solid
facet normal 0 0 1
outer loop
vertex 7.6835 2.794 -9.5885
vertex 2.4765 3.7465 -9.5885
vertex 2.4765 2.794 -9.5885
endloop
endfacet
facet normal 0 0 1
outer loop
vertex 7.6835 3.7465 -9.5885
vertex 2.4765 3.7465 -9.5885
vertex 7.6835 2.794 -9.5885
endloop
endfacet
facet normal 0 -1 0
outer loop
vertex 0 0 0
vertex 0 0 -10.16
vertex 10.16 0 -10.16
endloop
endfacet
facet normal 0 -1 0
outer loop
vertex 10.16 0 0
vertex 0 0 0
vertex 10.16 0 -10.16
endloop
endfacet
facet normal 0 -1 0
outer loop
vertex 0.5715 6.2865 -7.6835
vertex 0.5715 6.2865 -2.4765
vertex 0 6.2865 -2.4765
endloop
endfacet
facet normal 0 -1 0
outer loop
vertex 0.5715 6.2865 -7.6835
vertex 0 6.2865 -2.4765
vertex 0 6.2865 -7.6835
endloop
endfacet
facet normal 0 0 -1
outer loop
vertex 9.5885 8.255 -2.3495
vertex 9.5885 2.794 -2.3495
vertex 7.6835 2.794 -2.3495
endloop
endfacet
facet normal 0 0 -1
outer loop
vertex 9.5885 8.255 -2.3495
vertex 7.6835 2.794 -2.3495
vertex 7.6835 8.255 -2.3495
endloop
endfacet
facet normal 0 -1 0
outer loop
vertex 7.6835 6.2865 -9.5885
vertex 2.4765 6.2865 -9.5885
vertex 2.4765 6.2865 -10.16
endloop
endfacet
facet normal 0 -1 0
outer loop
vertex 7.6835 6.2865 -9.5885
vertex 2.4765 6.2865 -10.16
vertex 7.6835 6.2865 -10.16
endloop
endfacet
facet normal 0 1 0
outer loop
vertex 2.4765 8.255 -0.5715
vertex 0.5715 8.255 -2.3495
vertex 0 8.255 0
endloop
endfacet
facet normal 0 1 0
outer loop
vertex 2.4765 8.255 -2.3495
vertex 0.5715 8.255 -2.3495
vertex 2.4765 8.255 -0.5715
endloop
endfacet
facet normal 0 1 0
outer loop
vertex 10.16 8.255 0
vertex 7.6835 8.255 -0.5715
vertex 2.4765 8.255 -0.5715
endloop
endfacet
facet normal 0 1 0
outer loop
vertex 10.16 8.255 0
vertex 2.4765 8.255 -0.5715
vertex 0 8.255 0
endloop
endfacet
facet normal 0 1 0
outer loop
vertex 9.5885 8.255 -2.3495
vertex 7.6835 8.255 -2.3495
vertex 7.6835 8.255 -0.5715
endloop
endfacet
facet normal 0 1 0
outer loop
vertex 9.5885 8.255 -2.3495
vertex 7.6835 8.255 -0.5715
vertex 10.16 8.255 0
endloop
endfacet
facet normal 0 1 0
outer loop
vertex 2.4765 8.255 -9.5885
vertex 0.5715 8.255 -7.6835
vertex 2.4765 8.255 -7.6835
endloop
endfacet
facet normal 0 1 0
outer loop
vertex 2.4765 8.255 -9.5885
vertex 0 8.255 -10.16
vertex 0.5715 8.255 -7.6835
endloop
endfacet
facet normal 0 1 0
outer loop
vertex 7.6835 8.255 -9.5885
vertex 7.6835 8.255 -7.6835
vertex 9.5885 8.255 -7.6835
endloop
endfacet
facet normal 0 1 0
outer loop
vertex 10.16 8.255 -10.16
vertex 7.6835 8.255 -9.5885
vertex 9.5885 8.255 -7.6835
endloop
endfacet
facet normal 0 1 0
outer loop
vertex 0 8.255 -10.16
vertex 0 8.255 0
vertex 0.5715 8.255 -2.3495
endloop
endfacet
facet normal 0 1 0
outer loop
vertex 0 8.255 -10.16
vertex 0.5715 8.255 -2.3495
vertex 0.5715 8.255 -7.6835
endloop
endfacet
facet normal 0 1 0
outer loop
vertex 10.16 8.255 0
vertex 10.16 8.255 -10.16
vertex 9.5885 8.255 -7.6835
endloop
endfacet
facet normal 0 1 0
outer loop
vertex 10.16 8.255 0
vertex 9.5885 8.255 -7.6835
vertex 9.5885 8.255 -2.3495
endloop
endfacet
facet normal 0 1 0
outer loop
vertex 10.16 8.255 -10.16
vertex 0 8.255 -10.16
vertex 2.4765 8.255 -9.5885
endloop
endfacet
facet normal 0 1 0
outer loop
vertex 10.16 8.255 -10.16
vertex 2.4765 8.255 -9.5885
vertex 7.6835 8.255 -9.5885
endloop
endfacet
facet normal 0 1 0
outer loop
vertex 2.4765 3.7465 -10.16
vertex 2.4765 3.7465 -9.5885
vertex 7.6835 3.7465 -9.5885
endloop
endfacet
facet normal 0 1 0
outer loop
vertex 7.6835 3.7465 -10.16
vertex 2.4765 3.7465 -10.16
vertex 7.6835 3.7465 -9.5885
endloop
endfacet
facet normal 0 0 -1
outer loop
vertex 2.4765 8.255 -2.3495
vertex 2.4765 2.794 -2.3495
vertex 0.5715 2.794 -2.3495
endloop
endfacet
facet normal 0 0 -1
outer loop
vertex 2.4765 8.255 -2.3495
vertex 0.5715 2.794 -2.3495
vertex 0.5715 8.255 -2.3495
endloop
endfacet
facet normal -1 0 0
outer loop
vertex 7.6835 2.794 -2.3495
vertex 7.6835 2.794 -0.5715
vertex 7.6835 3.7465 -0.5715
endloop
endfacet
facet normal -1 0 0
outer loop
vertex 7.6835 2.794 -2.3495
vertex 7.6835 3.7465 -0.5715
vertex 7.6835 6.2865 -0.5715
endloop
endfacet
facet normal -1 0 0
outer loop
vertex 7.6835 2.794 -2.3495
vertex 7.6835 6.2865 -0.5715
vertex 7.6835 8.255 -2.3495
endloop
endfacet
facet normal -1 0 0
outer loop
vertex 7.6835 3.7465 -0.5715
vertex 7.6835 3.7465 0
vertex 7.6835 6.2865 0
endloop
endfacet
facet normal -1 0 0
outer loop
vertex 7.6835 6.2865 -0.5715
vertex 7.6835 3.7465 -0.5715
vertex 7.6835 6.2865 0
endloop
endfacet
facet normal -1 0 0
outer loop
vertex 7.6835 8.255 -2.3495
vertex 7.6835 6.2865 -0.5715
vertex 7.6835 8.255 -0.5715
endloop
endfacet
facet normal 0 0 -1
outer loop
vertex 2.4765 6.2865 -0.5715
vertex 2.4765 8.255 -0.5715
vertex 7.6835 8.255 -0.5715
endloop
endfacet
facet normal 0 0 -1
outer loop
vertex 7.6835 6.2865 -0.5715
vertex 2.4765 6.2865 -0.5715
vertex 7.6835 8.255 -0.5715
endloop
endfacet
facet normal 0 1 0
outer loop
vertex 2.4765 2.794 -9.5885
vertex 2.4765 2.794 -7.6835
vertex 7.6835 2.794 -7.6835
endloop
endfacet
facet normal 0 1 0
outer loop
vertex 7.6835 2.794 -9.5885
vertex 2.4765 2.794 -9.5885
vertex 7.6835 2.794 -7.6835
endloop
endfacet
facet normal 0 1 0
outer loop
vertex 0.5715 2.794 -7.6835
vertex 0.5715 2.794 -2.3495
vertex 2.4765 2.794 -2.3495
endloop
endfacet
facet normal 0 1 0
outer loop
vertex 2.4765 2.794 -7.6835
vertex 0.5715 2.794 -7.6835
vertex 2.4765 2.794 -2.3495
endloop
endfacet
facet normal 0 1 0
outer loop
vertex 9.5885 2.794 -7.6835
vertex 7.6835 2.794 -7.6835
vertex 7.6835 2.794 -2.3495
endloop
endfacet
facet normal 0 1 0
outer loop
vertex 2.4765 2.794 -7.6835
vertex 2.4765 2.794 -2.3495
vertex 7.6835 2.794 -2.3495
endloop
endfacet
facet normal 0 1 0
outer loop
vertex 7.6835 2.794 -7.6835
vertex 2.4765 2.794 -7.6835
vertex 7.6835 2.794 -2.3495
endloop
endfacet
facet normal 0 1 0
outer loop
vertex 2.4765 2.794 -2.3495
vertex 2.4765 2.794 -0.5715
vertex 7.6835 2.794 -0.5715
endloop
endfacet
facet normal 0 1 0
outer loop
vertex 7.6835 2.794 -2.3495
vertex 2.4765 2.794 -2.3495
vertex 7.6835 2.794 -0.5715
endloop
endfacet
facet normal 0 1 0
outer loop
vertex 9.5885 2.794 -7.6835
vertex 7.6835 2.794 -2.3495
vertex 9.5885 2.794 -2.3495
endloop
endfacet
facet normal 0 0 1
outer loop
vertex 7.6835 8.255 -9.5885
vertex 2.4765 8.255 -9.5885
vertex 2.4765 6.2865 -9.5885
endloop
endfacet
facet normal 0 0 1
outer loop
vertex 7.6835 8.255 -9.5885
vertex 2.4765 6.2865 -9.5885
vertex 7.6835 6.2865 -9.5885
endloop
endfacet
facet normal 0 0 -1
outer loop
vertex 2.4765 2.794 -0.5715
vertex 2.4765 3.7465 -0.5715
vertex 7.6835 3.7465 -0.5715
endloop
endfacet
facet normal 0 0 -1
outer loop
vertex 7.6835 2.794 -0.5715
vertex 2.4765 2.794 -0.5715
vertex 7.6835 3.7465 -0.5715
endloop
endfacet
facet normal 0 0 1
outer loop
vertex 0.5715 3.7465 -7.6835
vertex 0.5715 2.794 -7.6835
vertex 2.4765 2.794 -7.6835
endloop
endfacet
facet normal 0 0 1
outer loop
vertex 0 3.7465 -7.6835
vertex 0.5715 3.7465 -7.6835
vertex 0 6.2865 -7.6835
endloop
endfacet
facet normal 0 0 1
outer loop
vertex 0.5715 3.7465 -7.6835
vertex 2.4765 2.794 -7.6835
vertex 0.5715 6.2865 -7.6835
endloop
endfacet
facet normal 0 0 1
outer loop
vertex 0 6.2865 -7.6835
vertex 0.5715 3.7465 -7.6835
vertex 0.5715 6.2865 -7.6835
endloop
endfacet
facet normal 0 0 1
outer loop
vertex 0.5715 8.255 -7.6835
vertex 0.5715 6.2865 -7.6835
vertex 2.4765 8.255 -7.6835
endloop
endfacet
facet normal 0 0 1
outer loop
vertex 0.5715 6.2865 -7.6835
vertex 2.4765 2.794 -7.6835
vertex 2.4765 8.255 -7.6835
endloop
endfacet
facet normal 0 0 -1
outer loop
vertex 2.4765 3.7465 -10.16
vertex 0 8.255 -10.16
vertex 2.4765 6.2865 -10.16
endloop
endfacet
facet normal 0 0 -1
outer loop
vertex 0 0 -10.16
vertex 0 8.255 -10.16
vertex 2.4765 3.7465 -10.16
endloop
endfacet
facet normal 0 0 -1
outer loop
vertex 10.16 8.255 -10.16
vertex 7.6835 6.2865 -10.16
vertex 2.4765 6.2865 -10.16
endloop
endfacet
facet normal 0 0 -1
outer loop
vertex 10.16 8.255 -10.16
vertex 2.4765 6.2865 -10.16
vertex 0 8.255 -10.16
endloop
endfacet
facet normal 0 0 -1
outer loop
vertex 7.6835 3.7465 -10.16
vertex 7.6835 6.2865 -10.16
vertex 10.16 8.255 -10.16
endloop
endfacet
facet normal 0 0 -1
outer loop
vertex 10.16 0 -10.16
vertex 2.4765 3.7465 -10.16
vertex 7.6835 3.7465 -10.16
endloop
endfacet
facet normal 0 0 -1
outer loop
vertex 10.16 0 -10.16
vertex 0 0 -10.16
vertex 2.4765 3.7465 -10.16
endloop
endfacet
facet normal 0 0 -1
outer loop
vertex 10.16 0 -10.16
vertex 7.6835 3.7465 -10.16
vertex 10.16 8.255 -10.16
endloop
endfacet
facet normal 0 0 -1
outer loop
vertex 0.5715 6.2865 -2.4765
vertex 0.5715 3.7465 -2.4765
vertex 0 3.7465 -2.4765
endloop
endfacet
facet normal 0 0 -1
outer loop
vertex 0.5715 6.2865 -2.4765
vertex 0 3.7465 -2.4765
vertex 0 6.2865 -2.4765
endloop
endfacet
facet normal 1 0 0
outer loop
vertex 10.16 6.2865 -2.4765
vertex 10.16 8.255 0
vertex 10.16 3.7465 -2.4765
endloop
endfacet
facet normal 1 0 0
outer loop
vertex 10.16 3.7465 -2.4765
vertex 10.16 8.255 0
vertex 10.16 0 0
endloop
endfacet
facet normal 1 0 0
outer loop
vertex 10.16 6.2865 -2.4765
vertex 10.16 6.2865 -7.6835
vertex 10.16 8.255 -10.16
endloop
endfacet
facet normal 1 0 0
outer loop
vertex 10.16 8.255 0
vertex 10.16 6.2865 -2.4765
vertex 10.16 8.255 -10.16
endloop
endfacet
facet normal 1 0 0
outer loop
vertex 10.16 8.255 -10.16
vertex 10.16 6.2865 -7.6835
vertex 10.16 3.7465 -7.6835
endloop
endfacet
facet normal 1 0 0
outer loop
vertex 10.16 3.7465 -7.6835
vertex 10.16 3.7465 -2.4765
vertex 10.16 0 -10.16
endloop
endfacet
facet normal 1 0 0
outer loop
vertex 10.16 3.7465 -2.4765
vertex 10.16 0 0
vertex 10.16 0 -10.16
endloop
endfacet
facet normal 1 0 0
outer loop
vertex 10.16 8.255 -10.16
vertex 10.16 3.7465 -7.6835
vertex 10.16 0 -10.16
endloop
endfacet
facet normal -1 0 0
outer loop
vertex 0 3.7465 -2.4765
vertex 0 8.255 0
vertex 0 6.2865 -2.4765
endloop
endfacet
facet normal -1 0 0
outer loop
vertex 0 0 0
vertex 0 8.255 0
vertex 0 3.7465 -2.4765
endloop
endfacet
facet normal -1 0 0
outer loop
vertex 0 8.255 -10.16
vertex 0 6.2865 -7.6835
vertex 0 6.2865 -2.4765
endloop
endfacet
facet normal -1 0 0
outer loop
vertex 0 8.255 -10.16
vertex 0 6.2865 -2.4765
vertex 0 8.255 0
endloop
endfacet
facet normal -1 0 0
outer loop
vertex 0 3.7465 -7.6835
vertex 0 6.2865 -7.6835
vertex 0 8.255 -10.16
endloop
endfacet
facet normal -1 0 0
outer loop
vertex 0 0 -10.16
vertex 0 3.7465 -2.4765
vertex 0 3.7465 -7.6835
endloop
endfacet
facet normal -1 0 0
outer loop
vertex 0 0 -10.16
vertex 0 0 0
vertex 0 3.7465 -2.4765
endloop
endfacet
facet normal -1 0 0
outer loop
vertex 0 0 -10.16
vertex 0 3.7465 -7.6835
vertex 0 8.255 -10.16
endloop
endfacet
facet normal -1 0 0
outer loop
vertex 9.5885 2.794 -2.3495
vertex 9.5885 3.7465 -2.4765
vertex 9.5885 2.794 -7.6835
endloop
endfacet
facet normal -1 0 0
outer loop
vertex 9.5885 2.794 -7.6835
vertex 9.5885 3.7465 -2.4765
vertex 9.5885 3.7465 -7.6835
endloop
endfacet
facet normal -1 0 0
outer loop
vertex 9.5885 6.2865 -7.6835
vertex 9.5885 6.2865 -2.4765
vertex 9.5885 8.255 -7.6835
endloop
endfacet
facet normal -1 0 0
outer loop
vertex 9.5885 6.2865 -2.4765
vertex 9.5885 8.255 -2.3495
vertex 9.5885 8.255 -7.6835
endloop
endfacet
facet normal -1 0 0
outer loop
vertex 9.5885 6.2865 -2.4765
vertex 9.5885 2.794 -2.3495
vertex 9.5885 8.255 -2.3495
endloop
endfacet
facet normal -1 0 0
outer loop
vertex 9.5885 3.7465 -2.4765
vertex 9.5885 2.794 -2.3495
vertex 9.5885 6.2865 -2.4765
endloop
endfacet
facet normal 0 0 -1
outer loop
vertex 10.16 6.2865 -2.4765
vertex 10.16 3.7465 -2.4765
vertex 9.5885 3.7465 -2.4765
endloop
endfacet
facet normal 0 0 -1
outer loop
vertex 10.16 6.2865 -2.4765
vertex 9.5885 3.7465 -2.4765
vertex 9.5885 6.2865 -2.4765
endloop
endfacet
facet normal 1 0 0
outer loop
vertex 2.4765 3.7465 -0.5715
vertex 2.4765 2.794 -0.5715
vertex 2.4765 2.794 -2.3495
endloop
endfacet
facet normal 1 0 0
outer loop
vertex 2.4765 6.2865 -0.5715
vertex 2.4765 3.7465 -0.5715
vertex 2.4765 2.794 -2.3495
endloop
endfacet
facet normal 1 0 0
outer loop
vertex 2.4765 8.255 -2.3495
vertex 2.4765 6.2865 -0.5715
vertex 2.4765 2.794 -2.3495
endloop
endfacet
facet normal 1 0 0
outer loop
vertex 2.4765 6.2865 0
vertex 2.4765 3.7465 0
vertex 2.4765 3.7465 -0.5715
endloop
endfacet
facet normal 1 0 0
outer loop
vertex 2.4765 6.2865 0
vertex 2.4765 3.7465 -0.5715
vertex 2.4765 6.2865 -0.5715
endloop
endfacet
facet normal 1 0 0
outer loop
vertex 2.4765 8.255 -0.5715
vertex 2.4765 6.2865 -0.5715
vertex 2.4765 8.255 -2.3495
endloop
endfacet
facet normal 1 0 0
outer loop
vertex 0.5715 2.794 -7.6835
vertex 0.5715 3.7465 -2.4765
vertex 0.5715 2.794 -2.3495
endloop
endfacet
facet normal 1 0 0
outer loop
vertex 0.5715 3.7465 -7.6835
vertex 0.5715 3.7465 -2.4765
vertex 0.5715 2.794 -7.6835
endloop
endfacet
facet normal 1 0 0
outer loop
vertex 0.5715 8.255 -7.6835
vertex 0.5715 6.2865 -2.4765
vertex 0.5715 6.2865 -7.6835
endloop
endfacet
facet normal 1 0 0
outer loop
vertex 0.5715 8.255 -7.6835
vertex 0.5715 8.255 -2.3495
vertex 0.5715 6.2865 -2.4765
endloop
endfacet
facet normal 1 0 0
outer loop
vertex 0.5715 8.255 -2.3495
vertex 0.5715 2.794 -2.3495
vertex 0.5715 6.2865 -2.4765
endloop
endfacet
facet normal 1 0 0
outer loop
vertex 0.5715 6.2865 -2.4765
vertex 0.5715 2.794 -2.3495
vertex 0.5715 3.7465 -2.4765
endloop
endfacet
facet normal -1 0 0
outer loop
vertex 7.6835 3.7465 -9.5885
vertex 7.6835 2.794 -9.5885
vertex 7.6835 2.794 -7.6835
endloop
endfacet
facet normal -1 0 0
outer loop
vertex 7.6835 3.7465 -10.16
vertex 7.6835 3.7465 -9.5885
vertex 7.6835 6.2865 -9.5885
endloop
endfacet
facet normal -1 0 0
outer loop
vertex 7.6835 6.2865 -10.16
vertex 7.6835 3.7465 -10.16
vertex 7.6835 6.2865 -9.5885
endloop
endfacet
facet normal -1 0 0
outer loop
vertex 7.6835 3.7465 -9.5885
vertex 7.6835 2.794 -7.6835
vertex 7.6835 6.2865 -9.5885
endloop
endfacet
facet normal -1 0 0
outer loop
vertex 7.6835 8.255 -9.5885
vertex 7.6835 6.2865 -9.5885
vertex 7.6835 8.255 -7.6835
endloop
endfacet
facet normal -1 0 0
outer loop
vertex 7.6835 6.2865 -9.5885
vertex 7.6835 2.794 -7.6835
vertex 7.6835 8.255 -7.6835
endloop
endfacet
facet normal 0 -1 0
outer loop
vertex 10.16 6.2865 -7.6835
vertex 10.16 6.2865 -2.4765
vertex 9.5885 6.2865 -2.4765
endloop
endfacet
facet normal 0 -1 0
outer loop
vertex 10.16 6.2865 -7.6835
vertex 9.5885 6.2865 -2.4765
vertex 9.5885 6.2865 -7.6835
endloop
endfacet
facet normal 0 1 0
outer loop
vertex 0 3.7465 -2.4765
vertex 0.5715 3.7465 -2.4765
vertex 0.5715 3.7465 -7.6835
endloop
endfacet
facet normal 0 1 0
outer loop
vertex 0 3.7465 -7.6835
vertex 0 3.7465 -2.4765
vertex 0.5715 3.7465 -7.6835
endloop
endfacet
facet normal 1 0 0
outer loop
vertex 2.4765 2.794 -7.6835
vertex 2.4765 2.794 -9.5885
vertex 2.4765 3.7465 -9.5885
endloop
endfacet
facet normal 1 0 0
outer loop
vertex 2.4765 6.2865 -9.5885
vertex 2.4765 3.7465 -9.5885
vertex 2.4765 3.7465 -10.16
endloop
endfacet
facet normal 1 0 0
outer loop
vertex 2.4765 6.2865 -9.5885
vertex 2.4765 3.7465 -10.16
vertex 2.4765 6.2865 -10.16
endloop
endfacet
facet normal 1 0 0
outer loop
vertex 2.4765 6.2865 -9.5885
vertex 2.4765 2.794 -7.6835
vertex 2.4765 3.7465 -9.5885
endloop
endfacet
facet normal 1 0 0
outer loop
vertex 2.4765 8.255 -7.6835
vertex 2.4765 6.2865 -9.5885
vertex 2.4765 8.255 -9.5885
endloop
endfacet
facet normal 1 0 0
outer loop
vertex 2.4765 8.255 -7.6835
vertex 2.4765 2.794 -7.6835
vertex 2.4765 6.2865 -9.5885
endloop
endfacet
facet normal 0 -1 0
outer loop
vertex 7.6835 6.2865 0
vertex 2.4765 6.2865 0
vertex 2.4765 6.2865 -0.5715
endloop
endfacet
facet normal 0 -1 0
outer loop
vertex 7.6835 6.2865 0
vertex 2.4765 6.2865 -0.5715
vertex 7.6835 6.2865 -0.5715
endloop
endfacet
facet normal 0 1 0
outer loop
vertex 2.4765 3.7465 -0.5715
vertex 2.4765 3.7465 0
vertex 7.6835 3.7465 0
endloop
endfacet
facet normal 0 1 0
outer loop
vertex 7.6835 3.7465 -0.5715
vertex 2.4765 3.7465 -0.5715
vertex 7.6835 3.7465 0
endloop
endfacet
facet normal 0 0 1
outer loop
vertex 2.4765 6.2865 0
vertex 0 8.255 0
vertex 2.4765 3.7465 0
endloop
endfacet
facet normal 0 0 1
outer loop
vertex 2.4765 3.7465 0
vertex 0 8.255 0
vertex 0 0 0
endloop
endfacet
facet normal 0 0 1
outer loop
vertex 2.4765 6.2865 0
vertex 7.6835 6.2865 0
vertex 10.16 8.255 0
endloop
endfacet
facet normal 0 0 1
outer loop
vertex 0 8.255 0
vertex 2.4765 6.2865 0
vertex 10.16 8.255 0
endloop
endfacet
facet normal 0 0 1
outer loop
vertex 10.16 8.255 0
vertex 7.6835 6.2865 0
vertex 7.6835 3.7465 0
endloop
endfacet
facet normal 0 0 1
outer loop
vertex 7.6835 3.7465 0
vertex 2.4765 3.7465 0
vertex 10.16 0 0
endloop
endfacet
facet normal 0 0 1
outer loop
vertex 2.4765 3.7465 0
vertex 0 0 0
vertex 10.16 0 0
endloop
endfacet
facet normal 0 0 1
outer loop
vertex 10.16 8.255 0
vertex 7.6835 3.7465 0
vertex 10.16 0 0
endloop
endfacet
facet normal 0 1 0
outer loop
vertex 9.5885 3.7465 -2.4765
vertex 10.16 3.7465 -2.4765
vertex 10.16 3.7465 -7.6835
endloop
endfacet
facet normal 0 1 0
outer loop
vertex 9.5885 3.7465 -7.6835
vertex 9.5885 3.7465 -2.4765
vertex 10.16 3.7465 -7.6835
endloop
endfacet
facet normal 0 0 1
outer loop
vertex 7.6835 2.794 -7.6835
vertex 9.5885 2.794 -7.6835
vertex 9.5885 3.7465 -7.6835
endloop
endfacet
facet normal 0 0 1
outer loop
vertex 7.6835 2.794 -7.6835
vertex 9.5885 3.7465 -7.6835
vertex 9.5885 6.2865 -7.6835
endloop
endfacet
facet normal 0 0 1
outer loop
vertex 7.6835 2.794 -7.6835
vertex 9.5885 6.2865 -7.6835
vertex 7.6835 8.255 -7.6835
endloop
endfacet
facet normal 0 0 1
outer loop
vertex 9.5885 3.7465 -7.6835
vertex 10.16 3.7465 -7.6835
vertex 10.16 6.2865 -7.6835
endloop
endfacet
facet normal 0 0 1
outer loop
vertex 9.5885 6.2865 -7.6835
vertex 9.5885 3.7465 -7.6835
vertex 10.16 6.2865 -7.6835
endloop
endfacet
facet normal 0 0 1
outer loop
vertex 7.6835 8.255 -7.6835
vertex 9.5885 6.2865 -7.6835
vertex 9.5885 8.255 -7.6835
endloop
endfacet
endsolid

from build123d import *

# Parameters (mm, degrees)
SKETCH1_W           = 10.16
SKETCH1_H           = 10.16
BOSS_EXTRUDE1_DEPTH = 8.255
SKETCH2_W           = 3.556
SKETCH2_H           = 2.54
CUT_EXTRUDE3_DEPTH  = 10.16
CUT_EXTRUDE4_START  = -0.5715
SKETCH4_W           = 5.207
SKETCH4_H           = 5.461
CUT_EXTRUDE4_DEPTH  = 9.017
CUT_EXTRUDE5_START  = -0.5715
SKETCH5_W           = 5.334
SKETCH5_H           = 5.461
CUT_EXTRUDE5_DEPTH  = 9.017
SKETCH6_W           = 3.556
SKETCH6_H           = 2.54
CUT_EXTRUDE6_DEPTH  = 10.16
SKETCH7_W           = 5.207
SKETCH7_H           = 2.54
CUT_EXTRUDE7_DEPTH  = 10.16
SKETCH8_W           = 5.207
SKETCH8_H           = 2.54
CUT_EXTRUDE8_DEPTH  = 10.16


with BuildPart() as part:
    # Sketch1 → Boss-Extrude1 (new body)
    with BuildSketch(Plane(origin=(0, 0, 0), x_dir=(1, 0, 0), z_dir=(0, 1, 0))):
        with Locations((5.08, 5.08)):
            Rectangle(SKETCH1_W, SKETCH1_H)
    extrude(amount=BOSS_EXTRUDE1_DEPTH)

    # Sketch2 → Cut-Extrude3 (cut)
    with BuildSketch(Plane.XY):
        with Locations((5.08, 5.0165)):
            Rectangle(SKETCH2_W, SKETCH2_H)
    extrude(amount=-CUT_EXTRUDE3_DEPTH, mode=Mode.SUBTRACT)

    # Sketch4 → Cut-Extrude4 (cut)
    with BuildSketch(Plane.XY.offset(CUT_EXTRUDE4_START)):
        with Locations((5.08, 5.5245)):
            Rectangle(SKETCH4_W, SKETCH4_H)
    extrude(amount=-CUT_EXTRUDE4_DEPTH, mode=Mode.SUBTRACT)

    # Sketch5 → Cut-Extrude5 (cut)
    with BuildSketch(Plane(origin=(10.16, 0, 0), x_dir=(0, 0, -1), z_dir=(1, 0, 0)).offset(CUT_EXTRUDE5_START)):
        with Locations((5.0165, 5.5245)):
            Rectangle(SKETCH5_W, SKETCH5_H)
    extrude(amount=-CUT_EXTRUDE5_DEPTH, mode=Mode.SUBTRACT)

    # Sketch6 → Cut-Extrude6 (cut)
    with BuildSketch(Plane(origin=(10.16, 0, 0), x_dir=(0, 0, -1), z_dir=(1, 0, 0))):
        with Locations((5.08, 5.0165)):
            Rectangle(SKETCH6_W, SKETCH6_H)
    extrude(amount=-CUT_EXTRUDE6_DEPTH, mode=Mode.SUBTRACT)

    # Sketch7 → Cut-Extrude7 (cut)
    with BuildSketch(Plane.XY):
        with Locations((5.08, 5.0165)):
            Rectangle(SKETCH7_W, SKETCH7_H)
    extrude(amount=-CUT_EXTRUDE7_DEPTH, mode=Mode.SUBTRACT)

    # Sketch8 → Cut-Extrude8 (cut)
    with BuildSketch(Plane(origin=(10.16, 0, 0), x_dir=(0, 0, -1), z_dir=(1, 0, 0))):
        with Locations((5.08, 5.0165)):
            Rectangle(SKETCH8_W, SKETCH8_H)
    extrude(amount=-CUT_EXTRUDE8_DEPTH, mode=Mode.SUBTRACT)


solid = part.part
